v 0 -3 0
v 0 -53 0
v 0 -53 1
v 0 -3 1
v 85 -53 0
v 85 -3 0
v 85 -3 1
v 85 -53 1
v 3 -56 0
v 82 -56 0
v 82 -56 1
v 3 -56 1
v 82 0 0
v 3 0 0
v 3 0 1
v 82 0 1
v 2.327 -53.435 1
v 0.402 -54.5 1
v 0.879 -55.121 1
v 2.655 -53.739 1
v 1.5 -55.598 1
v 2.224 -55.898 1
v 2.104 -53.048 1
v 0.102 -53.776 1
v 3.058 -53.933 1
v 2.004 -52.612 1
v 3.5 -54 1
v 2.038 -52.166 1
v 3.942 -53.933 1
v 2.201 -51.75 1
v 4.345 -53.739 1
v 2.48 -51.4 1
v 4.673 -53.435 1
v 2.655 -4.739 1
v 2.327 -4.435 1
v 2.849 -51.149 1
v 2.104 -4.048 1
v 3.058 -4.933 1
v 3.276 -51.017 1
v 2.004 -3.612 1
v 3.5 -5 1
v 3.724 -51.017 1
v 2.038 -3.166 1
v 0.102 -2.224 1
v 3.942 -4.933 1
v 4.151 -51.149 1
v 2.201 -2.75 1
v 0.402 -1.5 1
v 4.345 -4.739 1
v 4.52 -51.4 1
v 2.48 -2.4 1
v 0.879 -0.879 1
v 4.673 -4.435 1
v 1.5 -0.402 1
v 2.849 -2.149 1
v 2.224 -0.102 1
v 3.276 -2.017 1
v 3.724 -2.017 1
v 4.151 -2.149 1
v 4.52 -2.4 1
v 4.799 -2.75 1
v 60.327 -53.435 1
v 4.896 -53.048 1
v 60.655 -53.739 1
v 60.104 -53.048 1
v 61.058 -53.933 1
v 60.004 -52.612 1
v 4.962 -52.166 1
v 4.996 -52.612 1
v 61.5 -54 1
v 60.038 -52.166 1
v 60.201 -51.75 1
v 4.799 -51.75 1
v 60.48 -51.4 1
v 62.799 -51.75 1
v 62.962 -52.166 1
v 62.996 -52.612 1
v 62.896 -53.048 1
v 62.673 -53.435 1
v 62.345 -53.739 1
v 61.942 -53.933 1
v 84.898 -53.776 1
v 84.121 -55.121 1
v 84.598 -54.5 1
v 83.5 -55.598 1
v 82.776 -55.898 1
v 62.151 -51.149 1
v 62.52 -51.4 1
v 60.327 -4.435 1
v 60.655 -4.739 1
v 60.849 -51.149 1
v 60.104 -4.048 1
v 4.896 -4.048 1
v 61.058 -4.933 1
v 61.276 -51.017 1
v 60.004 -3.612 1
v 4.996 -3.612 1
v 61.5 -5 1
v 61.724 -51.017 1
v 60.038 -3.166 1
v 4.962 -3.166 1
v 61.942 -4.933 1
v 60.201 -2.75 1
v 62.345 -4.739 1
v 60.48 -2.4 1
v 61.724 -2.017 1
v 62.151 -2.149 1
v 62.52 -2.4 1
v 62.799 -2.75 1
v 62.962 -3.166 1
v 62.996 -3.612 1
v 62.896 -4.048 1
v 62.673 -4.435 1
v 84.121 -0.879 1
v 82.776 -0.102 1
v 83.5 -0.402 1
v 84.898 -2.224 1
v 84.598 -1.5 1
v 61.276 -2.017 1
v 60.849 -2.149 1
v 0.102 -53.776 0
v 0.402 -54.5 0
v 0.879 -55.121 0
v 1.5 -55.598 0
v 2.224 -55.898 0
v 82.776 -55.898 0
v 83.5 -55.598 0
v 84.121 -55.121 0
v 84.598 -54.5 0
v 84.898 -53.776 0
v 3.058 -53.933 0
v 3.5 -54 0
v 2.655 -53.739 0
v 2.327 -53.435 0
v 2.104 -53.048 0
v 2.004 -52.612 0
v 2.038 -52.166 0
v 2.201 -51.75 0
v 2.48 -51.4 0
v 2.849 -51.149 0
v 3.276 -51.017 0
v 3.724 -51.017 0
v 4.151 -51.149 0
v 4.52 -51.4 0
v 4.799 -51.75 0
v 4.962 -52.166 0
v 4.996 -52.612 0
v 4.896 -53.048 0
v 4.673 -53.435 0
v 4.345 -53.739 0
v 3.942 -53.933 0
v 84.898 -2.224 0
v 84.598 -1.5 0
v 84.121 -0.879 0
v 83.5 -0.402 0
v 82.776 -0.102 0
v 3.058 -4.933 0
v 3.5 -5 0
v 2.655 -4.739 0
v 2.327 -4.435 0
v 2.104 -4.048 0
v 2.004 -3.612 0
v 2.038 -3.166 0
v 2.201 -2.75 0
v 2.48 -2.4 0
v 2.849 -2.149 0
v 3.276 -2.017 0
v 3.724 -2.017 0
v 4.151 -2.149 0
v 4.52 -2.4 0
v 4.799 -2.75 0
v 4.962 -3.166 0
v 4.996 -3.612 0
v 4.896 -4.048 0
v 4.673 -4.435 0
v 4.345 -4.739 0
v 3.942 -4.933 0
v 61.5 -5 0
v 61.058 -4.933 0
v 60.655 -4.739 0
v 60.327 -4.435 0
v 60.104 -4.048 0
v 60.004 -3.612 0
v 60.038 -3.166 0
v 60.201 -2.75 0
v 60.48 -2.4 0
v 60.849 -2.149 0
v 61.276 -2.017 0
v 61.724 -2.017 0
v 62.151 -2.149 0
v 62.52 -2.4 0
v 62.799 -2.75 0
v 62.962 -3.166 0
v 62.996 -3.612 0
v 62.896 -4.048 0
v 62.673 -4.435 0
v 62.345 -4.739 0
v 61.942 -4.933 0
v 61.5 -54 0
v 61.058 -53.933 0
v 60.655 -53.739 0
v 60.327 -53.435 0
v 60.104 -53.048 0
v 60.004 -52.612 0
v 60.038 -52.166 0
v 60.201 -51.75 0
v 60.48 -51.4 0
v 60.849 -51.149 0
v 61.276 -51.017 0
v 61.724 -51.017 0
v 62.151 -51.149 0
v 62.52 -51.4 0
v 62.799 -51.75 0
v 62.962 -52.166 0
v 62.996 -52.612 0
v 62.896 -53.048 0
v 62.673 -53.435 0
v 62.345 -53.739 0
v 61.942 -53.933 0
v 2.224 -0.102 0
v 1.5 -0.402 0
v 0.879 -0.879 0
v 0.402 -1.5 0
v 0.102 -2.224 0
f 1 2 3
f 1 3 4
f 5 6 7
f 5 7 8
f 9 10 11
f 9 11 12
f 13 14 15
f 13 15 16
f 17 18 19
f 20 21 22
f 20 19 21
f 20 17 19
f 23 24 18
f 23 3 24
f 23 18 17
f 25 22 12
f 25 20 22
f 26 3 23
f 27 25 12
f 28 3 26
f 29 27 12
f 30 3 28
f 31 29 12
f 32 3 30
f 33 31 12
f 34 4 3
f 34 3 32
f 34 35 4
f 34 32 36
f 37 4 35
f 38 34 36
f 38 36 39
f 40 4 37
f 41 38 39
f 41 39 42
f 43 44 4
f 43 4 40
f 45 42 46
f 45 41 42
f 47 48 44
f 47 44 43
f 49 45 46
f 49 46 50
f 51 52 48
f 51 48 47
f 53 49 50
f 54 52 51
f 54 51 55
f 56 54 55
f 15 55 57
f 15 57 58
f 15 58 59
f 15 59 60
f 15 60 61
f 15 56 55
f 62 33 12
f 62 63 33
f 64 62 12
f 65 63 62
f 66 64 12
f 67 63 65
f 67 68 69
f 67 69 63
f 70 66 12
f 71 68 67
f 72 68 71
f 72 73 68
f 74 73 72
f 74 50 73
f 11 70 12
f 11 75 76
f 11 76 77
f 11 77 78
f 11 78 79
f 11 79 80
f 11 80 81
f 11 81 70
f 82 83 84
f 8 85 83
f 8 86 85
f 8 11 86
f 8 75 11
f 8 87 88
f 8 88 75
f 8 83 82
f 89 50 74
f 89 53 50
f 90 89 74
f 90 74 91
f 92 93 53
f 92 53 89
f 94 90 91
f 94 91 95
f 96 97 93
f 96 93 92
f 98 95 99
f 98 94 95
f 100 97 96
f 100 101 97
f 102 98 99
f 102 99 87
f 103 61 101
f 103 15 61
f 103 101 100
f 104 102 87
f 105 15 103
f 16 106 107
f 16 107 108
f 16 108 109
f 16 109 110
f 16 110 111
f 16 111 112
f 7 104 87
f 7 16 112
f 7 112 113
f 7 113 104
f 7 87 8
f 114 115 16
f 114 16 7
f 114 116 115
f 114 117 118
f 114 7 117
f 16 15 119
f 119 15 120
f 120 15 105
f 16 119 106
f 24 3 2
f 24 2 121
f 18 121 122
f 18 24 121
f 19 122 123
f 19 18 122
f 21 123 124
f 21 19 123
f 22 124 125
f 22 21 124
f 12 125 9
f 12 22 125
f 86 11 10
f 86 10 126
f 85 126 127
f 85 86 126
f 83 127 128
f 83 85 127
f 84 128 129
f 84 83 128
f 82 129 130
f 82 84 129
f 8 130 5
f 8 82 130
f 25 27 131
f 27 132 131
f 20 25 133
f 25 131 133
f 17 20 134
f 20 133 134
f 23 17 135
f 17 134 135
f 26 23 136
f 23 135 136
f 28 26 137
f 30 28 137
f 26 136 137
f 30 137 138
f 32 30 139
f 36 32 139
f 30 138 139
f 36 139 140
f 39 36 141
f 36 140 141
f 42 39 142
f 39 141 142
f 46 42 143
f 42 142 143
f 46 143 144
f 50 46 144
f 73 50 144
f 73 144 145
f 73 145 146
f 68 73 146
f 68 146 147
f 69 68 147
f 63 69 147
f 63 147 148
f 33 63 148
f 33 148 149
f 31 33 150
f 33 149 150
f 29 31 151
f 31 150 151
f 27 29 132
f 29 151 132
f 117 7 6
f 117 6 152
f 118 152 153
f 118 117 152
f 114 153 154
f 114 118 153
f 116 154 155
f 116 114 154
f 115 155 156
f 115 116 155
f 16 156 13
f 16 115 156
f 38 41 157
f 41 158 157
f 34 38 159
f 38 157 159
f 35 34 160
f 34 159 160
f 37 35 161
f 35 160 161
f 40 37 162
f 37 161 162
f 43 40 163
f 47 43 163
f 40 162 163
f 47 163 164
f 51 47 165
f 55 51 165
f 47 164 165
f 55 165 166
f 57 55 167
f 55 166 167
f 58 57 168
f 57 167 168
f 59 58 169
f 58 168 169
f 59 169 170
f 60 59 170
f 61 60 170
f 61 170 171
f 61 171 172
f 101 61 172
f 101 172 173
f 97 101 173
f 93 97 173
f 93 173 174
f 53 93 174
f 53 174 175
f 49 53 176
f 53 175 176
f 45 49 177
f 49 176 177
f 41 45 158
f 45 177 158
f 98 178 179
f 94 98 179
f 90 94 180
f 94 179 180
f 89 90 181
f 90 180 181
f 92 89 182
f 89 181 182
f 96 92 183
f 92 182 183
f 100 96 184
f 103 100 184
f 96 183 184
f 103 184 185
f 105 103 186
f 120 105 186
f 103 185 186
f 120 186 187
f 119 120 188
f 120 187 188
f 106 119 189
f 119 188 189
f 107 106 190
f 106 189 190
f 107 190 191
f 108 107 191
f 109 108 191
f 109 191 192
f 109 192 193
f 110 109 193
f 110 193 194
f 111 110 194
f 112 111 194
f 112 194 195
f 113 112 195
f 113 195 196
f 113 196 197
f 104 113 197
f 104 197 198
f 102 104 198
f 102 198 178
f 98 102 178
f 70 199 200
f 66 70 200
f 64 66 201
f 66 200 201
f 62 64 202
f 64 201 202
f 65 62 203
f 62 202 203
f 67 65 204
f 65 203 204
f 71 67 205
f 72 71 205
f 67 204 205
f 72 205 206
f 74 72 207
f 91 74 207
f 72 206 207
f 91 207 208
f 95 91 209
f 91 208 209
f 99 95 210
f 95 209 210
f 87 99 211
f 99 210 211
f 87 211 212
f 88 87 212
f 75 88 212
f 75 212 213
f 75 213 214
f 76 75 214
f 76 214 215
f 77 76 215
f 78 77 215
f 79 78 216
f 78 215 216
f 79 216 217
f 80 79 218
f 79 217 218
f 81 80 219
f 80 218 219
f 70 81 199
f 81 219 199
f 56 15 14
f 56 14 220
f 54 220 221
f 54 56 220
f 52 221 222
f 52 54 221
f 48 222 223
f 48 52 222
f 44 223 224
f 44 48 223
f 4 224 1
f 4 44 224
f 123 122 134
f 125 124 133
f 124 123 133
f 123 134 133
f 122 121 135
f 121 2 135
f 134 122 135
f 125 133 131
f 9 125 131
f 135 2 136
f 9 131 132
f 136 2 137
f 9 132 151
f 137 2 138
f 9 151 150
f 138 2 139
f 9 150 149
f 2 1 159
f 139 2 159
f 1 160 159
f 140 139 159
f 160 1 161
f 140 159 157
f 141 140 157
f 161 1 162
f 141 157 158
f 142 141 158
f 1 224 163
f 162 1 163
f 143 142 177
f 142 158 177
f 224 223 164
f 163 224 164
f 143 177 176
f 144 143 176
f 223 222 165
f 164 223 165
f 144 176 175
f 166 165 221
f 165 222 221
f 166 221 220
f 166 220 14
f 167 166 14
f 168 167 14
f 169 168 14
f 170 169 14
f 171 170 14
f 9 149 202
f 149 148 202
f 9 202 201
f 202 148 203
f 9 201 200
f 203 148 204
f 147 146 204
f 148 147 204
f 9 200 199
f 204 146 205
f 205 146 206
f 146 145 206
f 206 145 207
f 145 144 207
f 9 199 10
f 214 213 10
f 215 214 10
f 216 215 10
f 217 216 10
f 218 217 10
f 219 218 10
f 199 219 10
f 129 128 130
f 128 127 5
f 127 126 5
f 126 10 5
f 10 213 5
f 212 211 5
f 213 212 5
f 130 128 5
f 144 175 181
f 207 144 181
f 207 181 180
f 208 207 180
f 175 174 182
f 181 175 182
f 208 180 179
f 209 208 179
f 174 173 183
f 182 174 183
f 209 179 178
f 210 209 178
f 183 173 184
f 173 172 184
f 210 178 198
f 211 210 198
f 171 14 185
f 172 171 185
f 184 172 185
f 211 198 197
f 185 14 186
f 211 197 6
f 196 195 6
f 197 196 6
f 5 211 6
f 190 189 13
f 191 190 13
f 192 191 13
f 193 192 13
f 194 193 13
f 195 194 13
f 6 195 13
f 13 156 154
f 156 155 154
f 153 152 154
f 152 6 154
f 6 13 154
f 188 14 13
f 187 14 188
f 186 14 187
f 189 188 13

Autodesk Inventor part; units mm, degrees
ref_plane "YZ Plane" through (0, 0, 0) normal (1, 0, 0) x (0, 1, 0)
ref_plane "XZ Plane" through (0, 0, 0) normal (0, 1, 0) x (-1, 0, 0)
ref_plane "XY Plane" through (0, 0, 0) normal (0, 0, 1) x (1, 0, 0)
sketch "Sketch1" plane through (0, 0, 0) normal (0, 0, 1) x (1, 0, 0)
  line L0 (0, 0) -> (85, 0)
  line L1 (85, 0) -> (85, -56)
  line L2 (85, -56) -> (0, -56)
  line L3 (0, -56) -> (0, 0)
  dimension "d0" = 85
  dimension "d1" = 56
extrude "Extrusion1" add sketch "Sketch1" along normal blind 1
fillet "Congé1" radius 3 4 edges at (0, 0, 0.5) (85, 0, 0.5) (85, -56, 0.5) (0, -56, 0.5)
sketch "Esquisse2" plane through (0, 0, 1) normal (0, 0, 1) x (1, 0, 0)
  point P0 (0, 0)
sketch "Esquisse3" plane through (0, 0, 1) normal (0, 0, 1) x (1, 0, 0)
  arc A0 (0, -53) -> (3, -56) centre (3, -53) ccw construction
  line L0 (3, -56) -> (82, -56) construction
  arc A1 (82, -56) -> (85, -53) centre (82, -53) ccw construction
  line L1 (85, -53) -> (85, -3) construction
  arc A2 (85, -3) -> (82, 0) centre (82, -3) ccw construction
  line L2 (82, 0) -> (3, 0) construction
  arc A3 (3, 0) -> (0, -3) centre (3, -3) ccw construction
  line L3 (0, -3) -> (0, -53) construction
  line L4 (3.5, -3.5) -> (61.5, -3.5) construction
  line L5 (61.5, -3.5) -> (61.5, -52.5) construction
  line L6 (61.5, -52.5) -> (3.5, -52.5) construction
  line L7 (3.5, -52.5) -> (3.5, -3.5) construction
  point P0 (0, 0)
  dimension "d5" = 3.5
  dimension "d6" = 49
  dimension "d7" = 58
  dimension "d8" = 3.5
hole "Perçage1" at (61.5, -52.5, 1) at (3.5, -52.5, 1) at (3.5, -3.5, 1) at (61.5, -3.5, 1) direction (0, 0, -1) diameter 3 end through all
properties part number "R000"
